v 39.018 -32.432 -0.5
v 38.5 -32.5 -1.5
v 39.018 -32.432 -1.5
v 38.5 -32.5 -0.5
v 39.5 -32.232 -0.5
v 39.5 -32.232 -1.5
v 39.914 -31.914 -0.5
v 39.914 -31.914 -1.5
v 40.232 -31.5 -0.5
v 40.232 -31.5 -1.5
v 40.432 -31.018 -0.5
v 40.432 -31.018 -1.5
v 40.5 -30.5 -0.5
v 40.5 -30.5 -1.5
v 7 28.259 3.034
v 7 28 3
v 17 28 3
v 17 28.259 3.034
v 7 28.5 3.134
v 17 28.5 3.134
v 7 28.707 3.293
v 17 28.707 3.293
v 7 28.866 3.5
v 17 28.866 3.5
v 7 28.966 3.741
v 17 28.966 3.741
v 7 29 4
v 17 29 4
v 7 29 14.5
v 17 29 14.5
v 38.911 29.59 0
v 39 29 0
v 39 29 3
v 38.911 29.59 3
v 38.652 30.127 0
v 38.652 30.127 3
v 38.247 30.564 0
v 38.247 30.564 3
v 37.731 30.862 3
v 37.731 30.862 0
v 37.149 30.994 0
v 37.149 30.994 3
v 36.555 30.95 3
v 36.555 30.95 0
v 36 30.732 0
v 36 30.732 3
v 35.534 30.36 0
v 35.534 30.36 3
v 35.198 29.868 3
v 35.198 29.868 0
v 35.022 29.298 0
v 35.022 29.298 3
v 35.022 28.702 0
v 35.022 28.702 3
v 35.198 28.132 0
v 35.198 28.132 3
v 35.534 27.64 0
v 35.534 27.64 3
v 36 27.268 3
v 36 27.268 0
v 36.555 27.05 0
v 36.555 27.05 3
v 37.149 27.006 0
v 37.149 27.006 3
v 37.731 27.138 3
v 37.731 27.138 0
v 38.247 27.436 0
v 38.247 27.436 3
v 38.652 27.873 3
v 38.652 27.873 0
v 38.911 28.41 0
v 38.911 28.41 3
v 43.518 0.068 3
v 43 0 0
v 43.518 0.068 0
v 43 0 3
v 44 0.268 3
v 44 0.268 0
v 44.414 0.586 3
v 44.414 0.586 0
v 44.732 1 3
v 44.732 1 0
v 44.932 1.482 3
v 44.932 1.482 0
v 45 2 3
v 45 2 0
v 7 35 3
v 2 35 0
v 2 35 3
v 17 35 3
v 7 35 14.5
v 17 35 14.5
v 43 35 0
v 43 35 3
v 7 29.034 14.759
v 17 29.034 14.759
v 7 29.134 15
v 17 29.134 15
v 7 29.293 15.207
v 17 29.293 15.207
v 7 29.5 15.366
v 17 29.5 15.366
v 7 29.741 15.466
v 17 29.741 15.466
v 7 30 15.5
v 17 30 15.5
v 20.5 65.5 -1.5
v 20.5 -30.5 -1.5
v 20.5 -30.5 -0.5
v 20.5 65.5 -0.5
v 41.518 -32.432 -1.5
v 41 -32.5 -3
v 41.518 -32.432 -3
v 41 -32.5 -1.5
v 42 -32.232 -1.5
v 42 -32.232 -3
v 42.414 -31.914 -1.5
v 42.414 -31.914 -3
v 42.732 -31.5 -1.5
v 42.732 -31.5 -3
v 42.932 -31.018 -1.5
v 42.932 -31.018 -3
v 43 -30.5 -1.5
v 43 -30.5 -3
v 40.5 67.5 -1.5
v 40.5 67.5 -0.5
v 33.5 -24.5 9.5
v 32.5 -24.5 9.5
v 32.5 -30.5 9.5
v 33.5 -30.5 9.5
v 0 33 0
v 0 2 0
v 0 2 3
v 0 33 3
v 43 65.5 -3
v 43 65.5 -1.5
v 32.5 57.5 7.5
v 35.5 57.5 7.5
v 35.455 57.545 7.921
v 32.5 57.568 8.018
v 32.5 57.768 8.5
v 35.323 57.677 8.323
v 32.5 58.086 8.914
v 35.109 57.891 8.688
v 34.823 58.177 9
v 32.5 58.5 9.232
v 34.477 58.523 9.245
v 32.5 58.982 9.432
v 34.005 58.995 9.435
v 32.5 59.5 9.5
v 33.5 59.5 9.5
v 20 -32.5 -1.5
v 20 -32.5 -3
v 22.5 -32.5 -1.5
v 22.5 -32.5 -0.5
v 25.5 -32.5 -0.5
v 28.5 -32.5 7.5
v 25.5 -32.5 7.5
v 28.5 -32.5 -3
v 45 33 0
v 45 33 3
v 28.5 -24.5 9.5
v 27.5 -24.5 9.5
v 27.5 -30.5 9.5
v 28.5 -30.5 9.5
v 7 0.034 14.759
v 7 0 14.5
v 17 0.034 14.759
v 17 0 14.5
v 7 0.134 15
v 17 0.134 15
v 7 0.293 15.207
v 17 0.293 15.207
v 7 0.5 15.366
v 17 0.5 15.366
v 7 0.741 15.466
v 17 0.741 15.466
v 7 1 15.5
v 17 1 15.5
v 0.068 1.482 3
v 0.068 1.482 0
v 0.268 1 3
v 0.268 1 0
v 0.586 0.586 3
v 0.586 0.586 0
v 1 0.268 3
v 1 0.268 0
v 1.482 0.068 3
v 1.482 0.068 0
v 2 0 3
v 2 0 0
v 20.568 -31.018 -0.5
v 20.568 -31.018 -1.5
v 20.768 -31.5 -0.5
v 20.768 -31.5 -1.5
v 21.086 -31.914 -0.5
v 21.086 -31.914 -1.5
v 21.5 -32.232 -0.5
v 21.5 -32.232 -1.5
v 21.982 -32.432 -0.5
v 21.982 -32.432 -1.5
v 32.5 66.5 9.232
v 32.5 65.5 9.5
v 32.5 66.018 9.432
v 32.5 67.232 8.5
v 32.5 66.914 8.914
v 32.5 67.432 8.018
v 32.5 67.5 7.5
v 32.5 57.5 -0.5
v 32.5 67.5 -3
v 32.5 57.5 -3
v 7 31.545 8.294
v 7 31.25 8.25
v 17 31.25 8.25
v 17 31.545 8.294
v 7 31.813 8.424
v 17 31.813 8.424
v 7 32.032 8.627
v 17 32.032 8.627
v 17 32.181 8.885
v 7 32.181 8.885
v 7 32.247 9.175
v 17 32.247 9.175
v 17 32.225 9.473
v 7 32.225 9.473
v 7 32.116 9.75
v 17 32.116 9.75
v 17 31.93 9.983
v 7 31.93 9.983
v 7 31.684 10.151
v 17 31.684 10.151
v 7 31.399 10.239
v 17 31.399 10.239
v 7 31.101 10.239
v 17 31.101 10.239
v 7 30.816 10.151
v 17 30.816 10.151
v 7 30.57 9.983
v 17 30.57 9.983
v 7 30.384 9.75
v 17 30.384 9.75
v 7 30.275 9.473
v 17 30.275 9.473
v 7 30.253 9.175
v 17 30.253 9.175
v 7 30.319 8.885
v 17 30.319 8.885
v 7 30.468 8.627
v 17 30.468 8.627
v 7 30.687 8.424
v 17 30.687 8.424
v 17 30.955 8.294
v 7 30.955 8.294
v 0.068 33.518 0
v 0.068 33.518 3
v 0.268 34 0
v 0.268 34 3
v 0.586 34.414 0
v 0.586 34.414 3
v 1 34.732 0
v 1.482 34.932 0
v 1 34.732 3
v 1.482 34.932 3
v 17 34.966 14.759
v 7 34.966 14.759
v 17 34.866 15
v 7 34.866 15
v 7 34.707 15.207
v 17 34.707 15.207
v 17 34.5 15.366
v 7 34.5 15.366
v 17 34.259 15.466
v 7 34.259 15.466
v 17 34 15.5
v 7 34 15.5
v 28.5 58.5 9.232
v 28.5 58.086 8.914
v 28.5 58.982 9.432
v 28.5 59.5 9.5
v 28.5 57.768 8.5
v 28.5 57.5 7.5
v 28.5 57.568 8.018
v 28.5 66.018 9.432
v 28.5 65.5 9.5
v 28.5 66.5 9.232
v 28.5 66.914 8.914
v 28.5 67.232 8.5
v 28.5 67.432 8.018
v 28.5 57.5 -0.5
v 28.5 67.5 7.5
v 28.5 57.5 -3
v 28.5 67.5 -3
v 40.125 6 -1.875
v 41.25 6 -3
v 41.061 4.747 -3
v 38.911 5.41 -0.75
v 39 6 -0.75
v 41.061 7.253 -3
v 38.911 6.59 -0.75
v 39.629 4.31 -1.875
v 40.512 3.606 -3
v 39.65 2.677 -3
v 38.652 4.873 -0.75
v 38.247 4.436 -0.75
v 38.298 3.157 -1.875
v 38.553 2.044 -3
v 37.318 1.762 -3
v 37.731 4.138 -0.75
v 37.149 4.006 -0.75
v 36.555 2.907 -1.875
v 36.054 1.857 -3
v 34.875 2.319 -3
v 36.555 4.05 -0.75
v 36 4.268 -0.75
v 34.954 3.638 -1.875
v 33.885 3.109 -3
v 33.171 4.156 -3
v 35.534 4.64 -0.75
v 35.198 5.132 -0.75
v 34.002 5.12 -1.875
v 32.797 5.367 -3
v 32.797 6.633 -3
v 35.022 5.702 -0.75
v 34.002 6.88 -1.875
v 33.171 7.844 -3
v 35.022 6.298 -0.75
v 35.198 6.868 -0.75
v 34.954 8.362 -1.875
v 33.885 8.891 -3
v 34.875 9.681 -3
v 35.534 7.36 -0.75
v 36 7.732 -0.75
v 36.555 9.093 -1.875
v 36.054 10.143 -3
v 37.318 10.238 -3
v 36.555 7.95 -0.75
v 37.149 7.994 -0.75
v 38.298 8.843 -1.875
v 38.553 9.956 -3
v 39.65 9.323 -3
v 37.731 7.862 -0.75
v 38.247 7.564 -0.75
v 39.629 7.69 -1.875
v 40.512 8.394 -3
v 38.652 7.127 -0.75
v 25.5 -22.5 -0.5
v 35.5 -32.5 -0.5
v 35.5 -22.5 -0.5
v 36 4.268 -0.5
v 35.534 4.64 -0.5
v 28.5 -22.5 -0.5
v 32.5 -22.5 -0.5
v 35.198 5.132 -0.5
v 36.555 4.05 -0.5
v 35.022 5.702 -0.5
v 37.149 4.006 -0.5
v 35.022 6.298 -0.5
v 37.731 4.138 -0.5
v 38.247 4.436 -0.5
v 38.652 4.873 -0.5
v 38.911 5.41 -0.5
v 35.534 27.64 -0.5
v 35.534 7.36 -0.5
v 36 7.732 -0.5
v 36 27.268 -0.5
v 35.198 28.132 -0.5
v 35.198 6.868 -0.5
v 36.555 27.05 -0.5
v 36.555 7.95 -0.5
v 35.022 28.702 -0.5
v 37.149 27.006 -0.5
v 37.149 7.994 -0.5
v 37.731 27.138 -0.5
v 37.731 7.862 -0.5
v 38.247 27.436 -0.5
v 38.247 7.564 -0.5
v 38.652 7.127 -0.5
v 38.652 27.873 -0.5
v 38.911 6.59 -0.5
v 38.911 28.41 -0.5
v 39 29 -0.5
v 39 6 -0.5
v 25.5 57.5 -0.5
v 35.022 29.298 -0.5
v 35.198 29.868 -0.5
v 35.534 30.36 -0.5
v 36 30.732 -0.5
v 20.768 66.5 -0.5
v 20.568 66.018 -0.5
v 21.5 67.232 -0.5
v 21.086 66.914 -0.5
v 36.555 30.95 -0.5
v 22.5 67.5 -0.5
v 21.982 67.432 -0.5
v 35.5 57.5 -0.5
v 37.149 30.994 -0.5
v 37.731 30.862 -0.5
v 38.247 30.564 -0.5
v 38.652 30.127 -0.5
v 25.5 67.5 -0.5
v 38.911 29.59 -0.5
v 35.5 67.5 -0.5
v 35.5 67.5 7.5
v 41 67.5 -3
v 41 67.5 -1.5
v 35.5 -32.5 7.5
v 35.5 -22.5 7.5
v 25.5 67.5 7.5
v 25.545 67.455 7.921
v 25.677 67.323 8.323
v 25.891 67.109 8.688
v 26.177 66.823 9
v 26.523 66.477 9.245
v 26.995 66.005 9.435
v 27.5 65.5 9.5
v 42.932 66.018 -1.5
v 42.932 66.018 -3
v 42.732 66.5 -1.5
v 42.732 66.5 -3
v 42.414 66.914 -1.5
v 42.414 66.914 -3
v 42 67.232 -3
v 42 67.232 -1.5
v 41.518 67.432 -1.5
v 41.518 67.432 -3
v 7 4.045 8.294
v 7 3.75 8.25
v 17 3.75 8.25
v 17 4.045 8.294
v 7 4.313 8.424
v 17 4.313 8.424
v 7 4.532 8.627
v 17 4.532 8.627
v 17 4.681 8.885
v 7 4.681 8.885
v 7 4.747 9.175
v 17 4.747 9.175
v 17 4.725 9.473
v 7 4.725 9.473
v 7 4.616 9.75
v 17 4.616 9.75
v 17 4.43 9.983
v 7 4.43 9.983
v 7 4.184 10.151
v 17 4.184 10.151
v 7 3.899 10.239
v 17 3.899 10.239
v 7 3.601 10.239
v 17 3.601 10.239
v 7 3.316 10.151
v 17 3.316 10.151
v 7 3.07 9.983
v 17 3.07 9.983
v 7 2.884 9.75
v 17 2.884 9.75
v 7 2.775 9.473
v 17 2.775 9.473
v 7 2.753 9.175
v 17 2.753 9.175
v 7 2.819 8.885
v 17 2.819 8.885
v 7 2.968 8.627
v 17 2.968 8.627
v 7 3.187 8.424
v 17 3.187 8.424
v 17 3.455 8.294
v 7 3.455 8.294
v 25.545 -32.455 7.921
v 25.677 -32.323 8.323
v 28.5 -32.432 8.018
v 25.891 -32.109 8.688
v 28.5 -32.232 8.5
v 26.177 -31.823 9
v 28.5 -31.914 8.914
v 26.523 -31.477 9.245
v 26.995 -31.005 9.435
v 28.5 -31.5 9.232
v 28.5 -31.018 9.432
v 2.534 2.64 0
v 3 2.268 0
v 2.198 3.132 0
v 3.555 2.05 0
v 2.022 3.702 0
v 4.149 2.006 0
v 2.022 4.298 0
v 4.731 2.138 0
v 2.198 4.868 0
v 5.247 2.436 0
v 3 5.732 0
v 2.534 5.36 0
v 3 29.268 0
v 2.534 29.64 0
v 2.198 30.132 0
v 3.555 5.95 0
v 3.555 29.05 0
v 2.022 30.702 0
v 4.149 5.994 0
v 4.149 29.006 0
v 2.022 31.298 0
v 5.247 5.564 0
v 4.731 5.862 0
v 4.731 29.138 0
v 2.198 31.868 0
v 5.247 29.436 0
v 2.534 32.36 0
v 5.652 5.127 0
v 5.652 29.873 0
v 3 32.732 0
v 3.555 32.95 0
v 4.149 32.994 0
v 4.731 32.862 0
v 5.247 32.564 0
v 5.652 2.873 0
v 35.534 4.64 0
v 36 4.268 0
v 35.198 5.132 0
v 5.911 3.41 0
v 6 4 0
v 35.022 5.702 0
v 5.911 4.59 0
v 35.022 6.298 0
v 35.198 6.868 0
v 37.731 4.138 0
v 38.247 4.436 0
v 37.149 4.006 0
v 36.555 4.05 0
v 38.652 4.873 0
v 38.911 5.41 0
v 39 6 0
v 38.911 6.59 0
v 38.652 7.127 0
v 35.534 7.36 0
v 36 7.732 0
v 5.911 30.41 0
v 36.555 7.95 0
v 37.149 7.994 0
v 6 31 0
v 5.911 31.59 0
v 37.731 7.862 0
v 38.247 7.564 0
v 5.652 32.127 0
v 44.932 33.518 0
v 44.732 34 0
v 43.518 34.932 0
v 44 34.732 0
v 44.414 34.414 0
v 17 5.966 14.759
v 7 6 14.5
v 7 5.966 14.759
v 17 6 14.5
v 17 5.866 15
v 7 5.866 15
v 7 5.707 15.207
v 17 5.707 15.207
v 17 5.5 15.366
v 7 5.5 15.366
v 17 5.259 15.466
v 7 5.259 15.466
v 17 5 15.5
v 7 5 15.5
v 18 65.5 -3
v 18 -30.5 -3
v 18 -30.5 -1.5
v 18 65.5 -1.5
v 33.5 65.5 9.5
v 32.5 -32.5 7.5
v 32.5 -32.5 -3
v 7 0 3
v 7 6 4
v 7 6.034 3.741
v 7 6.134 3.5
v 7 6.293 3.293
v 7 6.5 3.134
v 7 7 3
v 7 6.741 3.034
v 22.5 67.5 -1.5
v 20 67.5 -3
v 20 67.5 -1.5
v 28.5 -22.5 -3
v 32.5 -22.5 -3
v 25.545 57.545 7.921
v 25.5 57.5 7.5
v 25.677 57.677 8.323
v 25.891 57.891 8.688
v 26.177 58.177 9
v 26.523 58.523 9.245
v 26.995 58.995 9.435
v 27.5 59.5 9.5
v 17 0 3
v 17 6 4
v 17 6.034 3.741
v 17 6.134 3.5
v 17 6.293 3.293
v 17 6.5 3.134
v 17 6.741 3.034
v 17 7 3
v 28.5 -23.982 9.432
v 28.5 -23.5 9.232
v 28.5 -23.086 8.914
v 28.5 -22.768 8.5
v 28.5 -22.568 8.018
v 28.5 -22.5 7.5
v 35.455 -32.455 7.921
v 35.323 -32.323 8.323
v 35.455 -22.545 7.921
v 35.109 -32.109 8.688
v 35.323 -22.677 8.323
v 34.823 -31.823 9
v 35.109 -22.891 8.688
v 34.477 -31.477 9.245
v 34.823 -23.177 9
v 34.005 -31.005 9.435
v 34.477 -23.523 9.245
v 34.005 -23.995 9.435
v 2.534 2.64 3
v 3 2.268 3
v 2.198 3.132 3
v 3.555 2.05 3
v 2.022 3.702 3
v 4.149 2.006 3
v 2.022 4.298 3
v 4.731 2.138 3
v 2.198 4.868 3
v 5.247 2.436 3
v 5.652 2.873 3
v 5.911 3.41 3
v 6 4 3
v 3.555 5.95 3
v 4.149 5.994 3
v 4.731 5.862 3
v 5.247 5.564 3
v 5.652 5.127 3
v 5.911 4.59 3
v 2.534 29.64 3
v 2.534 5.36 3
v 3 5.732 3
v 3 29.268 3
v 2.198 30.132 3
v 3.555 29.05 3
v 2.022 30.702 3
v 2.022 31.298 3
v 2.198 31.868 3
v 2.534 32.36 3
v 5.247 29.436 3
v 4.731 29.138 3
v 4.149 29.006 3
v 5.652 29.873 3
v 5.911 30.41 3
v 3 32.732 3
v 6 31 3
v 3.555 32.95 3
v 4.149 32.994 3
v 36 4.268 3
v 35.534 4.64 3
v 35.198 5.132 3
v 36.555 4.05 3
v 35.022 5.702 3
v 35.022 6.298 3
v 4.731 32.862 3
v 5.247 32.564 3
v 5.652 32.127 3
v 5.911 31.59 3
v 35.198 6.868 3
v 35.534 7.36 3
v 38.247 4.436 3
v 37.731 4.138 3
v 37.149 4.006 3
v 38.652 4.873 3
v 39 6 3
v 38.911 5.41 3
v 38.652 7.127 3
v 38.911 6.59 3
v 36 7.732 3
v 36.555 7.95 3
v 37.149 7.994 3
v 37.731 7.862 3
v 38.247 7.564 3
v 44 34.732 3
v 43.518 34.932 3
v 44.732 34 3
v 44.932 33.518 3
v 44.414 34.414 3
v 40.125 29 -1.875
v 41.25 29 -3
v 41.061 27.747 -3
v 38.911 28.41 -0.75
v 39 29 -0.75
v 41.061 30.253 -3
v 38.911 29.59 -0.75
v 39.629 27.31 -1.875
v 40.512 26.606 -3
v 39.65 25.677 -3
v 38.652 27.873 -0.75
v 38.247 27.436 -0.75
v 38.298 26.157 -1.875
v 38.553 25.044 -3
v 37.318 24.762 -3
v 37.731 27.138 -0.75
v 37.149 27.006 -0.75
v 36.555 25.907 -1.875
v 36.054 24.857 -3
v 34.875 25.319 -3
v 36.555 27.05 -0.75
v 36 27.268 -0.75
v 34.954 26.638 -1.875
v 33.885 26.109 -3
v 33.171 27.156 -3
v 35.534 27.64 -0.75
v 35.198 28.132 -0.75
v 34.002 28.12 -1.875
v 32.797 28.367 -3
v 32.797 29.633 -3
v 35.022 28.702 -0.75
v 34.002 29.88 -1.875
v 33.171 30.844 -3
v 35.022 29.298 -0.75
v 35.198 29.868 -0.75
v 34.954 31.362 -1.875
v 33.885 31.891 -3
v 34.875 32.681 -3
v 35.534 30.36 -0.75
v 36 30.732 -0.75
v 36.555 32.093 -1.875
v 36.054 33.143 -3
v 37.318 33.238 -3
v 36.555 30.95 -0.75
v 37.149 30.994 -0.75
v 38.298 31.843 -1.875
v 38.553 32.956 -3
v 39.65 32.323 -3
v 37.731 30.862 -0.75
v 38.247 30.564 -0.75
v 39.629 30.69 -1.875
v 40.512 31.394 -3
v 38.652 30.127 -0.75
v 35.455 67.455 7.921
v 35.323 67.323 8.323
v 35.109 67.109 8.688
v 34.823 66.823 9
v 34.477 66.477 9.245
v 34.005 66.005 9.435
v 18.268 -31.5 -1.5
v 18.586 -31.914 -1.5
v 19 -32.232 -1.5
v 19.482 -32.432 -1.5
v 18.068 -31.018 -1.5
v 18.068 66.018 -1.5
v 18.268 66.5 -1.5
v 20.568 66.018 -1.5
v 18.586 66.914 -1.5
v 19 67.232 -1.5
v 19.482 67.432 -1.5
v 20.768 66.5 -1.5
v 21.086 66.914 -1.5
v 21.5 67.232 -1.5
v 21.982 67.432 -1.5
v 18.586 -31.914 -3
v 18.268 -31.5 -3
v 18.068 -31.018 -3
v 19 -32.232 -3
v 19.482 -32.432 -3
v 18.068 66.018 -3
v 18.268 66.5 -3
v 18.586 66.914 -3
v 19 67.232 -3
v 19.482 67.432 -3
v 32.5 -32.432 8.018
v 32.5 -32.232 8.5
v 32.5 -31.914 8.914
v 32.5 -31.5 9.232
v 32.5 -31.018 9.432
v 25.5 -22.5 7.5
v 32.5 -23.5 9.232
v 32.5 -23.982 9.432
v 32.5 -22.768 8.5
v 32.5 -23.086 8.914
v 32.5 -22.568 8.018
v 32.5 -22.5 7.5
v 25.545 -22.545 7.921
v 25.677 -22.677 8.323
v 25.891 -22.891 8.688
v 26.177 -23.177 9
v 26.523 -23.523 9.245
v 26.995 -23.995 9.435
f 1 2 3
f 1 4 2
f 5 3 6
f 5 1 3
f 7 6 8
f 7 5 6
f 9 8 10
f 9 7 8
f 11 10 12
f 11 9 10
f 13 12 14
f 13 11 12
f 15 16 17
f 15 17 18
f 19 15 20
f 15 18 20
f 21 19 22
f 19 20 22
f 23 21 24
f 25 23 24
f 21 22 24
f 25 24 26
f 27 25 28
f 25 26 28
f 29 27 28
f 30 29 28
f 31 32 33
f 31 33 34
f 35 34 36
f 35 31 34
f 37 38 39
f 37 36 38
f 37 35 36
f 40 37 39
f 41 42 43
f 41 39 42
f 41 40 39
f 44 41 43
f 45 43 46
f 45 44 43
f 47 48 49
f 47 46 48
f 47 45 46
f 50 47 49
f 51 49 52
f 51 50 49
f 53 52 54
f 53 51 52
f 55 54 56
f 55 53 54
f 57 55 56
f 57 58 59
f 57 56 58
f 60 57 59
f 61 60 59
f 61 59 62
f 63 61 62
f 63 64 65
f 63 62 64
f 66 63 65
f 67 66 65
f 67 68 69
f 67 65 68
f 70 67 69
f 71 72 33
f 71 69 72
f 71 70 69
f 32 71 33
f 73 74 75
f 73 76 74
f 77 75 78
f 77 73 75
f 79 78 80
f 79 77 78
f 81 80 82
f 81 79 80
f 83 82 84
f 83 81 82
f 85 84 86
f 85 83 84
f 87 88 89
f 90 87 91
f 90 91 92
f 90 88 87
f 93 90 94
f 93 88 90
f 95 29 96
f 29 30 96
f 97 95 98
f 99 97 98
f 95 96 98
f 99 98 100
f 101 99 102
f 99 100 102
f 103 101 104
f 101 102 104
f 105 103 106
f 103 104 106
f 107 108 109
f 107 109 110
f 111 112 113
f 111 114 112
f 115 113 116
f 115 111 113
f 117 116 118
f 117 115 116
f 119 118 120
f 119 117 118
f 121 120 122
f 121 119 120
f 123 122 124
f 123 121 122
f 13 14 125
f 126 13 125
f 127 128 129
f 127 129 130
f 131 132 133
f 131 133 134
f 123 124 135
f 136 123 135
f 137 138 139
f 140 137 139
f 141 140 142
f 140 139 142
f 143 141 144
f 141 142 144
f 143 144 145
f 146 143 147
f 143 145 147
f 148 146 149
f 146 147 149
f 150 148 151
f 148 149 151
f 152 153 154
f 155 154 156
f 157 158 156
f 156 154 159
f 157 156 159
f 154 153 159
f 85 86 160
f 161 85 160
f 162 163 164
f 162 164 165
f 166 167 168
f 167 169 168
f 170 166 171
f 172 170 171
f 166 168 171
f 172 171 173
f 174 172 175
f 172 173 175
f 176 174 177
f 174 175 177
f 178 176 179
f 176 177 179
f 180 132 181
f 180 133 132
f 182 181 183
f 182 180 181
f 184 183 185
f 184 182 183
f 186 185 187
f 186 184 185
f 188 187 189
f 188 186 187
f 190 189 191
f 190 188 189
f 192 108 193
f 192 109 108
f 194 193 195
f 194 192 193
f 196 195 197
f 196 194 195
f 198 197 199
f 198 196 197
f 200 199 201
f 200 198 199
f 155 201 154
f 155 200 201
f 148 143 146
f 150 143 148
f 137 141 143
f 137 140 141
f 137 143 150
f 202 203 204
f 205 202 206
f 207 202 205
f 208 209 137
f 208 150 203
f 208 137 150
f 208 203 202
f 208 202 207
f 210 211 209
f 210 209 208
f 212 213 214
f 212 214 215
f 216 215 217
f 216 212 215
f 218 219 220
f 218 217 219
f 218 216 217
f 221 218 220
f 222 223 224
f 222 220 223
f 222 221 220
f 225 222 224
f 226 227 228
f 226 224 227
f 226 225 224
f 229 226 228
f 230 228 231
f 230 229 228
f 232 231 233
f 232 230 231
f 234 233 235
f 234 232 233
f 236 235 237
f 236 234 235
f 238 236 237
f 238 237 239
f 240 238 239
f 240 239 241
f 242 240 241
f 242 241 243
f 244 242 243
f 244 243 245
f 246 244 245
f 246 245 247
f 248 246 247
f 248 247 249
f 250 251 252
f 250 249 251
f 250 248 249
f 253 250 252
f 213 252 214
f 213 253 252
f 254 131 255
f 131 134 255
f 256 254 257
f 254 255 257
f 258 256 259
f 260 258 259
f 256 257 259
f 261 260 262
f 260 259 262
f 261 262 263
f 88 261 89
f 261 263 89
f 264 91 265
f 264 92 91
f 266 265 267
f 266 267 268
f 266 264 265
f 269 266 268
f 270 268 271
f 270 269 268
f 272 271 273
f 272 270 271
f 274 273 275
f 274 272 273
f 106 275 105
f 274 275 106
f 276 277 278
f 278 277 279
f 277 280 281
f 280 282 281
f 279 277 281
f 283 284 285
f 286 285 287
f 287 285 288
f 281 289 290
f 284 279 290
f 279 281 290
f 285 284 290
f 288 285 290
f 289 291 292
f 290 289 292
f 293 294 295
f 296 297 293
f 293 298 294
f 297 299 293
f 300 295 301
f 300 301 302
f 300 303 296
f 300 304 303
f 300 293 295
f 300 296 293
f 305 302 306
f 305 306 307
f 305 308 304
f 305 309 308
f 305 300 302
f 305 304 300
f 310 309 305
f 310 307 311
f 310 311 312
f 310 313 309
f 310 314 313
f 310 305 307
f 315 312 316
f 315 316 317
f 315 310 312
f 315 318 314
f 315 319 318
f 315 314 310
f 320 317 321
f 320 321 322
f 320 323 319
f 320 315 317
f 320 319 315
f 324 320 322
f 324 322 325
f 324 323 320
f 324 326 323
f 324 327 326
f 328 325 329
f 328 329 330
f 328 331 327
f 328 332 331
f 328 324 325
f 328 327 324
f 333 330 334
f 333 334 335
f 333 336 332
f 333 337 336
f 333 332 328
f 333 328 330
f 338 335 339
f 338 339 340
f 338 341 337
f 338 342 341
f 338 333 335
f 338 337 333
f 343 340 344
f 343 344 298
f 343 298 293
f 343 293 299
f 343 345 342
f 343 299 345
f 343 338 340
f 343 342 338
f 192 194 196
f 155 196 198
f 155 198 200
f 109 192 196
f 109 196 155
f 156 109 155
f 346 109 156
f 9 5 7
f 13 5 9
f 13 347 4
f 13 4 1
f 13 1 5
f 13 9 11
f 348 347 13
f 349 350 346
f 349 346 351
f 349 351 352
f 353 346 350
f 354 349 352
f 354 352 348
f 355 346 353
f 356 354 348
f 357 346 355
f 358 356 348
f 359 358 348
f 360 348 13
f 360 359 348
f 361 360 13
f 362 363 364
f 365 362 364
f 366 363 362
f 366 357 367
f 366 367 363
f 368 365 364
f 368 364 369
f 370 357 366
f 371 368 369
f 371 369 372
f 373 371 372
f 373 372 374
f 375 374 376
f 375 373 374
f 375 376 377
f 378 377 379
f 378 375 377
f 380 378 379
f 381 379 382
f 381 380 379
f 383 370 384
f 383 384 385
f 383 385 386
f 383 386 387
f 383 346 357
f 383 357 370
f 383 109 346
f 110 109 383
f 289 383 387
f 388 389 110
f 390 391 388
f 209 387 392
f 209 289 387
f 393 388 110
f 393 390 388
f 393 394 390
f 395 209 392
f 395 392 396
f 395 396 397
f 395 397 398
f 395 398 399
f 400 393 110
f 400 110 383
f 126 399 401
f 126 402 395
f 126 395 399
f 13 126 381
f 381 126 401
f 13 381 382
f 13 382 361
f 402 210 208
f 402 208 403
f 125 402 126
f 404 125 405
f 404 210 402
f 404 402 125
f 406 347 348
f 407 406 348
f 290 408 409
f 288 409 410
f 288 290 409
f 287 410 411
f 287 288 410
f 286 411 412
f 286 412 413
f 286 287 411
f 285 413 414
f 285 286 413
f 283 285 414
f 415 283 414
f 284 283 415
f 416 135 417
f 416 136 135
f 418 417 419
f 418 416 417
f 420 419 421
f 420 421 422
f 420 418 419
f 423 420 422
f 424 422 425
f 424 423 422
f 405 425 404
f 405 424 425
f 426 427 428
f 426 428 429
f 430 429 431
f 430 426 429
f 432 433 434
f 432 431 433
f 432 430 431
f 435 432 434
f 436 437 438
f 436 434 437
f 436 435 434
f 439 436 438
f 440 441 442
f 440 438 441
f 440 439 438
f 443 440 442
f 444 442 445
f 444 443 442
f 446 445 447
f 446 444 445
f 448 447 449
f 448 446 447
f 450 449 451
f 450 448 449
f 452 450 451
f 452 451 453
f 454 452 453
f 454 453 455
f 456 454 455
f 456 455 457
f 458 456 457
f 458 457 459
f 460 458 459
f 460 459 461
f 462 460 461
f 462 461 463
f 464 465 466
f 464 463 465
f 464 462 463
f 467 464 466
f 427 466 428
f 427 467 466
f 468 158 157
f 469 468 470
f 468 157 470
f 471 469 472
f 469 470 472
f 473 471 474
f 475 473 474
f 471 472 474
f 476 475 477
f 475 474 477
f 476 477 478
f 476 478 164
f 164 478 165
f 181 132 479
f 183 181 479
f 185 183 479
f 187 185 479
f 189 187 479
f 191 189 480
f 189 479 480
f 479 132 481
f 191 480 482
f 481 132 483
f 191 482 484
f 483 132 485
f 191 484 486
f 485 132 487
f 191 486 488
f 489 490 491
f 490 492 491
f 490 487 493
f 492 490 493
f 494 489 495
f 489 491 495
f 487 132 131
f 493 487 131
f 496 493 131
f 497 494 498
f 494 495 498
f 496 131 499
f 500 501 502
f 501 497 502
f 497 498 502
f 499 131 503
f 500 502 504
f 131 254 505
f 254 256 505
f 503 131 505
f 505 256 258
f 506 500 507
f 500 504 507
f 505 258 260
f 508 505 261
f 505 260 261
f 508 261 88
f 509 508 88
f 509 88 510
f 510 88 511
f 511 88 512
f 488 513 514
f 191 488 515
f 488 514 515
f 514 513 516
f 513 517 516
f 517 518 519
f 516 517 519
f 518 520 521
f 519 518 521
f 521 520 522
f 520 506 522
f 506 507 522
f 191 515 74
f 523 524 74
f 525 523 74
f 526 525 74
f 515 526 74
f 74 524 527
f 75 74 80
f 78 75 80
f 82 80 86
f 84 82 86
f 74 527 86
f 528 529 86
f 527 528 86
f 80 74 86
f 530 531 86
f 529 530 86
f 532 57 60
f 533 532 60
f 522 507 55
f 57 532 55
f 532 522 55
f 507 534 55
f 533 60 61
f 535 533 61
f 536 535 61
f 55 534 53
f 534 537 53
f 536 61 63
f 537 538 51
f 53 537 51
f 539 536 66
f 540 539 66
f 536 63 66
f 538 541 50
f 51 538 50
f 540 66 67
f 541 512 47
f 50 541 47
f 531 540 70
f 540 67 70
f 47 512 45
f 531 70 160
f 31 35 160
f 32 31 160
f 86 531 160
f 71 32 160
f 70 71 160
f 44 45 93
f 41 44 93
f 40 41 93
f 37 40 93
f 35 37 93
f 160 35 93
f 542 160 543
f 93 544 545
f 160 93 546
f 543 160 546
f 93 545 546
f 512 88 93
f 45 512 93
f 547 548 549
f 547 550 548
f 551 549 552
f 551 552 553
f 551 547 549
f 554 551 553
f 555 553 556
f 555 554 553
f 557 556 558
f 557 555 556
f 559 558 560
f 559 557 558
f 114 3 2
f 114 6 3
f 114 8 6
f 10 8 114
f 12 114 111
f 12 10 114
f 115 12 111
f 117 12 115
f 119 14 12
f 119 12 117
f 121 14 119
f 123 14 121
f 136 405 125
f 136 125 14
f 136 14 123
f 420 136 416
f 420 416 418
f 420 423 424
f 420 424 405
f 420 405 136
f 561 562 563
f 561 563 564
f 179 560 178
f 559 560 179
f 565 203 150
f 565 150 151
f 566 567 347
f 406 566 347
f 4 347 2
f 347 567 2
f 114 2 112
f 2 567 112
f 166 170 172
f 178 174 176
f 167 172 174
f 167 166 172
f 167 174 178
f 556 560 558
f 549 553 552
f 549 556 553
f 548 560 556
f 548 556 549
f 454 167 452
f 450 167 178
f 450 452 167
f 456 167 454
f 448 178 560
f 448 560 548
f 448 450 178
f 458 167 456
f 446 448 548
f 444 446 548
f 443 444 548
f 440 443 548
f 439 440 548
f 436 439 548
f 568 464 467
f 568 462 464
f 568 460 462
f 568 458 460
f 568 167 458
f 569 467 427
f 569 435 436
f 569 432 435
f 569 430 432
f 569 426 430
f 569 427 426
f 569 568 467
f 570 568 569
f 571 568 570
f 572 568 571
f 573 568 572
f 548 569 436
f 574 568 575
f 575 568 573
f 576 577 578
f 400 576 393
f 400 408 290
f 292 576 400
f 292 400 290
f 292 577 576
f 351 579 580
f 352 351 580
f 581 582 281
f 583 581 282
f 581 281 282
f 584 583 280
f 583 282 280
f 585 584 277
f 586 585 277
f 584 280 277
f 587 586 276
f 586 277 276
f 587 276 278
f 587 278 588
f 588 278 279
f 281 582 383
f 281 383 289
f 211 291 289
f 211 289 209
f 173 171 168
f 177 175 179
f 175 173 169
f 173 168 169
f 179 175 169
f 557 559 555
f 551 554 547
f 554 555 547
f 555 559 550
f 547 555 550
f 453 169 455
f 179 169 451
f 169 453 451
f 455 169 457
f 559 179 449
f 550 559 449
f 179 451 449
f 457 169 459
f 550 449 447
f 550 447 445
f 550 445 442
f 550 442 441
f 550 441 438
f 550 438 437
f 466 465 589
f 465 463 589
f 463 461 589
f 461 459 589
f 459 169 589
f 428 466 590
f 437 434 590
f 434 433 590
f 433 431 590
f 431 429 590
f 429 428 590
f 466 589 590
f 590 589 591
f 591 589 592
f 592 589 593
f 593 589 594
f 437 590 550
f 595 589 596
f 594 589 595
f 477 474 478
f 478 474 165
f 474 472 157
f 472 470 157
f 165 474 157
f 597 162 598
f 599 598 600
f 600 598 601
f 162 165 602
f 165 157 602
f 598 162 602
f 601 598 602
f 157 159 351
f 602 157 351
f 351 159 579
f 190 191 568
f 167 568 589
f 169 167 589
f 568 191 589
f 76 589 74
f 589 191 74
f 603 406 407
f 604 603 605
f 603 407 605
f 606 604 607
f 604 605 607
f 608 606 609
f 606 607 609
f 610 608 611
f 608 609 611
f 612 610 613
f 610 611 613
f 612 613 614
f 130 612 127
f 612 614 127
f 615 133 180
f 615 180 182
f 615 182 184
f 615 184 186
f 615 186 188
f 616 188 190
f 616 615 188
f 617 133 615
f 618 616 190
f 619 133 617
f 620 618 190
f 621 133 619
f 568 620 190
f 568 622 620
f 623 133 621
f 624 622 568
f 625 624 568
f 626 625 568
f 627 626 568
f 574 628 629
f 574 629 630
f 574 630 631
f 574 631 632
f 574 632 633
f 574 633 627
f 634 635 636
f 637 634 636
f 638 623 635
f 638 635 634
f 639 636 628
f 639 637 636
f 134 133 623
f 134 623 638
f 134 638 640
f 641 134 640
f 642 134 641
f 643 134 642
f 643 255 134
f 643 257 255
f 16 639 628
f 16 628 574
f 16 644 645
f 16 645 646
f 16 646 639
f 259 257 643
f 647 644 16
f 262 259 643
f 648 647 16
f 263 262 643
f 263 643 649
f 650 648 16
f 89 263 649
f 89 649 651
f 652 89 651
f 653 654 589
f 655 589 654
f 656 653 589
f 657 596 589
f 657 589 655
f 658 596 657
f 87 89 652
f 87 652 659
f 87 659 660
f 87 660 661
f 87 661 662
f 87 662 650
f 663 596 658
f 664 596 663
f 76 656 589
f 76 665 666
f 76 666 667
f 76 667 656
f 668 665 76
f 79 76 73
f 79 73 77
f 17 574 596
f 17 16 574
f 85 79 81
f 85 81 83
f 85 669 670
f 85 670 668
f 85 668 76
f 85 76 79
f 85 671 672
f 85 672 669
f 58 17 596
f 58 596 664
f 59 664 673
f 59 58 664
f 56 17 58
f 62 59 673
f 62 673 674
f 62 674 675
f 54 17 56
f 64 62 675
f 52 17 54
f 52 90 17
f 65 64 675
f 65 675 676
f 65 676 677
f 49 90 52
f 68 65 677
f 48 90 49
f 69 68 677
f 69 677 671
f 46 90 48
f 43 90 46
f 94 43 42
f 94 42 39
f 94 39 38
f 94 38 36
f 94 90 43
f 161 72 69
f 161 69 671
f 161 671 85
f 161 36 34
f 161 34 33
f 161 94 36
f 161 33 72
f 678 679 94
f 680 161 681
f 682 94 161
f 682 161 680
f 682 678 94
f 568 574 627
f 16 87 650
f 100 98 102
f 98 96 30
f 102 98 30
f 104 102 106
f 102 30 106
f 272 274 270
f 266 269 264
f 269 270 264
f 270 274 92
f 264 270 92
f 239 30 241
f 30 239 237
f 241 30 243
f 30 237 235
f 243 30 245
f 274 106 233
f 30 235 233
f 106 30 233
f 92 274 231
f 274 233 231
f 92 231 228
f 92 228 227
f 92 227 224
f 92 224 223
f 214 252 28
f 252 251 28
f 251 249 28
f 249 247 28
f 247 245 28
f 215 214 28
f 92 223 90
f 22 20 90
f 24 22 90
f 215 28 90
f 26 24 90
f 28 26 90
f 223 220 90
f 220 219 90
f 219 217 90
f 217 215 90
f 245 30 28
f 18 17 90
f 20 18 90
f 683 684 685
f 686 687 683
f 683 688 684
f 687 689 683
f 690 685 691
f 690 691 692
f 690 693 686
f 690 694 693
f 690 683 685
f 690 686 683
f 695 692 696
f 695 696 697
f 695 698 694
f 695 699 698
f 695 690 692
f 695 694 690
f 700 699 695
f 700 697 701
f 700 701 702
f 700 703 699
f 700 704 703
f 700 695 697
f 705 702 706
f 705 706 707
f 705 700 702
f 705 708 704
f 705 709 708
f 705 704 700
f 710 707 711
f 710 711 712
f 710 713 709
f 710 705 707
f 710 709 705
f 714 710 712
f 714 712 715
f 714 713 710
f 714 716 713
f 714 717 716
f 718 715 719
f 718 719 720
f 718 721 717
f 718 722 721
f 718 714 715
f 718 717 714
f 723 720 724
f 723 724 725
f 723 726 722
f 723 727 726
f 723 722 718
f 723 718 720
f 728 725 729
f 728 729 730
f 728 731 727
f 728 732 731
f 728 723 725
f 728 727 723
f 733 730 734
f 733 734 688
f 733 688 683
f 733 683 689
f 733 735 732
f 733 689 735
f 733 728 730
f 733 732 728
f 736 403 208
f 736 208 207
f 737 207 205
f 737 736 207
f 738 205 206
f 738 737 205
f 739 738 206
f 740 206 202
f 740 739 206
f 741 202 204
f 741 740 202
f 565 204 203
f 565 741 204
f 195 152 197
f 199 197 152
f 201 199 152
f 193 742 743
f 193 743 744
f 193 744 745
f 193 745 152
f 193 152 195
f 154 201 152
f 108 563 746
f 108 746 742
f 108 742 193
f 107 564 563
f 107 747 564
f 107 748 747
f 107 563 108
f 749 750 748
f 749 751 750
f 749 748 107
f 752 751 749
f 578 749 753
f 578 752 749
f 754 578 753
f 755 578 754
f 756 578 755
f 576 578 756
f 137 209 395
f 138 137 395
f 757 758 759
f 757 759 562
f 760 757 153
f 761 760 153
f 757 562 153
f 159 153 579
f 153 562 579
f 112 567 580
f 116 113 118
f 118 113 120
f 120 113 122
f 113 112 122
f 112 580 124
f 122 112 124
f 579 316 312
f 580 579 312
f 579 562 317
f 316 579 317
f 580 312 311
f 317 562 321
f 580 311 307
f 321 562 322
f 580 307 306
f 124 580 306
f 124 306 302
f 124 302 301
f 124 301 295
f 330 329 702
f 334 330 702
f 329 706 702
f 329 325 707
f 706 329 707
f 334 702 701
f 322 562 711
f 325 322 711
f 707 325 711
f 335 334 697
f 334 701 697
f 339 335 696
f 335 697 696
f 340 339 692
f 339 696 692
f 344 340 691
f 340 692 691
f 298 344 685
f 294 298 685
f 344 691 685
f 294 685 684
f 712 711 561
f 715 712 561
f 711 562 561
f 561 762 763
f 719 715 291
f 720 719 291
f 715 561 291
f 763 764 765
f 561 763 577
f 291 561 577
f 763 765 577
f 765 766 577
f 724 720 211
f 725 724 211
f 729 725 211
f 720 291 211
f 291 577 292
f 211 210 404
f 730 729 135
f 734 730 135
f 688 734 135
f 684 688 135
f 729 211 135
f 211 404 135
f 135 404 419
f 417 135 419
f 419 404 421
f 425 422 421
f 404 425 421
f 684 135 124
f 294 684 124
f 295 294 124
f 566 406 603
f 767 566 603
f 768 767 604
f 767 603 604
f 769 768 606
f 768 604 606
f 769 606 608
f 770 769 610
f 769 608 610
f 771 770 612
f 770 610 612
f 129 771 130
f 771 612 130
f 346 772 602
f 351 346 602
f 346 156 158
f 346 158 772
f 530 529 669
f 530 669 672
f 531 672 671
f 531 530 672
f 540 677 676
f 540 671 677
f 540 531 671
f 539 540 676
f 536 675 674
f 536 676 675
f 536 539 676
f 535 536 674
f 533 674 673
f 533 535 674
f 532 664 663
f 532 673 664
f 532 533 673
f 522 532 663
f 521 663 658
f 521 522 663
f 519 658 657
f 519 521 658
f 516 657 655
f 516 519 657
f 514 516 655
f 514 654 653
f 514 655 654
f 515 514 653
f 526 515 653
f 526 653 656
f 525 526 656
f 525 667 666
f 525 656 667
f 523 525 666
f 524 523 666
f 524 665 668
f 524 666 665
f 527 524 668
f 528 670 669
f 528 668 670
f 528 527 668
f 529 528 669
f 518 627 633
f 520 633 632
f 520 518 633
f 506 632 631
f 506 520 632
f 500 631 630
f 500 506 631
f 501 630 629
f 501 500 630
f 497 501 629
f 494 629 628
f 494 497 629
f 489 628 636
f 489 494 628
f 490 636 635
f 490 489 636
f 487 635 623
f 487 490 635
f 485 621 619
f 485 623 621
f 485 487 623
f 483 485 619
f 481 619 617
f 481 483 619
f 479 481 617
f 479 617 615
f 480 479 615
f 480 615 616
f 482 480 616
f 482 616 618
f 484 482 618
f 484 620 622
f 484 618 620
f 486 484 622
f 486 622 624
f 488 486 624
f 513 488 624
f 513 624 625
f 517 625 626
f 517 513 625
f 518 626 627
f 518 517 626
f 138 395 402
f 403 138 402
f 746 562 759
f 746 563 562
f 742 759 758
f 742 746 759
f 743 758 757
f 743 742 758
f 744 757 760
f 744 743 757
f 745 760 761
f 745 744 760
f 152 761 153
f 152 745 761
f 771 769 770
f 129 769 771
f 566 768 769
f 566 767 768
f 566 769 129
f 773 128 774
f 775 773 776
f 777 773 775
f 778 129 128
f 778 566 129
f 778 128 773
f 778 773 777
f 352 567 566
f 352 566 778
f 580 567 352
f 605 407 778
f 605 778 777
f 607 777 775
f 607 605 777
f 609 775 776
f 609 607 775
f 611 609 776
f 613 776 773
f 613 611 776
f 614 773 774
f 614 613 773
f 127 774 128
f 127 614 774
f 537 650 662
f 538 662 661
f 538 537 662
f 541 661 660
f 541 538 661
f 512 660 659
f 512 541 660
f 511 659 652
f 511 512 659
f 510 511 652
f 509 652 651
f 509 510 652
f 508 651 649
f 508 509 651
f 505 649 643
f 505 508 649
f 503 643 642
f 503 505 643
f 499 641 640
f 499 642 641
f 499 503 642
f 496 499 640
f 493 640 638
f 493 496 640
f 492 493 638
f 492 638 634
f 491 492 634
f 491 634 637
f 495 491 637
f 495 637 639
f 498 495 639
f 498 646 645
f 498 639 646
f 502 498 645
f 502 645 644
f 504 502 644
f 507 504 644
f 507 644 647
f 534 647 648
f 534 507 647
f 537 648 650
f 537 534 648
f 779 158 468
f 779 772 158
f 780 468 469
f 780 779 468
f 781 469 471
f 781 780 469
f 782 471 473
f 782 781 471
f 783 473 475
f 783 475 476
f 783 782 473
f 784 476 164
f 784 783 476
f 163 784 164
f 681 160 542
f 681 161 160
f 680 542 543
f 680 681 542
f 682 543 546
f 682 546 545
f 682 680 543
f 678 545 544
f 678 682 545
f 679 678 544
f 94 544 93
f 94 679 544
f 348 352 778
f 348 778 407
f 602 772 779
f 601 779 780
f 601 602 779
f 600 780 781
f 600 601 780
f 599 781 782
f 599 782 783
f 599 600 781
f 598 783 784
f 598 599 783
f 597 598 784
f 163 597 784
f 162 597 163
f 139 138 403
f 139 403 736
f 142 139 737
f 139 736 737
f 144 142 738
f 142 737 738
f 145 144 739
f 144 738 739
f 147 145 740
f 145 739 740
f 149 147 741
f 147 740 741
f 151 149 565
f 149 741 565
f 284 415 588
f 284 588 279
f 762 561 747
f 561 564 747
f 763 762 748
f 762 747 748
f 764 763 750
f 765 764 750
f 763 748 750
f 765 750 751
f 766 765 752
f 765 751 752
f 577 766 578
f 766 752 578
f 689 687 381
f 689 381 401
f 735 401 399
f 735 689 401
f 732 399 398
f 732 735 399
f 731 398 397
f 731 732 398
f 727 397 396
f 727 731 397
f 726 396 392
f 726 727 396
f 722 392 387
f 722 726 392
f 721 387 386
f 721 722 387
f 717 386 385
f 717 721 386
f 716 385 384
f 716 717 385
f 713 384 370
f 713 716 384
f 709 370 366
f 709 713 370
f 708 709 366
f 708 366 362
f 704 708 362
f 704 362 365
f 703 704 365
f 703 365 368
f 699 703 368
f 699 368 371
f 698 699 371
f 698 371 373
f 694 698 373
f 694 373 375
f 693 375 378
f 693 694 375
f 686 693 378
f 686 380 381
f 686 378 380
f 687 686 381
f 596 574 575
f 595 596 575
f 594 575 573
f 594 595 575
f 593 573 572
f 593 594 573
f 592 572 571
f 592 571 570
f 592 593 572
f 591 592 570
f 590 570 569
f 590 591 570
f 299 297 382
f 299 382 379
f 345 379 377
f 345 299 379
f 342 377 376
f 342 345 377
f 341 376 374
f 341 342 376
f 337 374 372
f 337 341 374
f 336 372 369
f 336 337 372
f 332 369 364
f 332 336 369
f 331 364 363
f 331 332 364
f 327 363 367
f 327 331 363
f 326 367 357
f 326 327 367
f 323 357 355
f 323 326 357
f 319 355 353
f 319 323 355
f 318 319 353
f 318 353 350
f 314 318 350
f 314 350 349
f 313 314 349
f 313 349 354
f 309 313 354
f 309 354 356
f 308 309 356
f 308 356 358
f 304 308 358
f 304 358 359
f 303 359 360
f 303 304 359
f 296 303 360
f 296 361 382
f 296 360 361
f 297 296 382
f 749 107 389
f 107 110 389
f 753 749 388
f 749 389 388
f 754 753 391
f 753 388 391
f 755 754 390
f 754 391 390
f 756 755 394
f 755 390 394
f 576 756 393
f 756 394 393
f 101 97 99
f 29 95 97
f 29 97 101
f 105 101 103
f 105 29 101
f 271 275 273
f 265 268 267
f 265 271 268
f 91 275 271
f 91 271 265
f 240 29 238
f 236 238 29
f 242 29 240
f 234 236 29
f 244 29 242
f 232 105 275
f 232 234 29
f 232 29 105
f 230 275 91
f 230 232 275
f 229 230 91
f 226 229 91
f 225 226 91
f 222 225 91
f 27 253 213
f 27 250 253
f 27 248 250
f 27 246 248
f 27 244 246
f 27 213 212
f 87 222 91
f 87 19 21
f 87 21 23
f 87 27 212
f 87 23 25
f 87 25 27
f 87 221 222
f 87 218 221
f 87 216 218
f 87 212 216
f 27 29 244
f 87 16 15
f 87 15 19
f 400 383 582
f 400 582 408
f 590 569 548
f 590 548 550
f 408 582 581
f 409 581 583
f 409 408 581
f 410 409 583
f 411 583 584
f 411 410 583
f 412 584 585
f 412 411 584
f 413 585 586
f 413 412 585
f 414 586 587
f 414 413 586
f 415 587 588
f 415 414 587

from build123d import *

# Parameters (mm, degrees)
BOX007_W          = 4
BOX007_H          = 10
BOX007_DEPTH      = 13
BOX008_W          = 4
BOX008_H          = 10
BOX008_DEPTH      = 13
BOX005_W          = 10
BOX005_H          = 10
BOX005_DEPTH      = 10
FILLET003_R       = 2
BOX006_W          = 10
BOX006_H          = 10
BOX006_DEPTH      = 10
FILLET004_R       = 2
CYLINDER007_R     = 2
CYLINDER007_DEPTH = 10
CYLINDER006_R     = 2
CYLINDER006_DEPTH = 10
BOX003_W          = 25
BOX003_H          = 100
BOX003_DEPTH      = 1.5
FILLET001_R       = 2
BOX004_W          = 20
BOX004_H          = 100
BOX004_DEPTH      = 1
FILLET002_R       = 2
CHAMFER_SIZE      = 2.25
CYLINDER_R        = 1
CYLINDER_DEPTH    = 28
CYLINDER004_R     = 2
CYLINDER004_DEPTH = 10
CYLINDER005_R     = 2
CYLINDER005_DEPTH = 10
CYLINDER003_R     = 2
CYLINDER003_DEPTH = 10
CYLINDER001_R     = 1
CYLINDER001_DEPTH = 28
CYLINDER002_R     = 2
CYLINDER002_DEPTH = 10
BOX002_W          = 16
BOX002_H          = 23
BOX002_DEPTH      = 12.5
BOX001_W          = 10
BOX001_H          = 35
BOX001_DEPTH      = 12.5
BOX_W             = 45
BOX_H             = 35
BOX_DEPTH         = 3
FILLET_R          = 2
FILLET005_R       = 1


with BuildPart() as cube006:
    # Box007 → Box007 (new body)
    with BuildSketch(Plane(origin=(28.5, -32.5, -3), x_dir=(1, 0, 0), z_dir=(0, 0, 1))):
        with Locations((2, 5)):
            Rectangle(BOX007_W, BOX007_H)
    extrude(amount=BOX007_DEPTH)


with BuildPart() as fusion005:
    # Box008 → Box008 (new body)
    with BuildSketch(Plane(origin=(28.5, 57.5, -3), x_dir=(1, 0, 0), z_dir=(0, 0, 1))):
        with Locations((2, 5)):
            Rectangle(BOX008_W, BOX008_H)
    extrude(amount=BOX008_DEPTH)

    # Fusion005: union Cube006
    add(cube006.part)


with BuildPart() as fillet003:
    # Box005 → Box005 (new body)
    with BuildSketch(Plane(origin=(25.5, -32.5, -0.5), x_dir=(1, 0, 0), z_dir=(0, 0, 1))):
        with Locations((5, 5)):
            Rectangle(BOX005_W, BOX005_H)
    extrude(amount=BOX005_DEPTH)

    # Fillet003
    fillet003_edges = [fillet003.edges().sort_by_distance(p)[0] for p in [
        (25.5, -27.5, 9.5),
        (35.5, -27.5, 9.5),
        (30.5, -32.5, 9.5),
        (30.5, -22.5, 9.5),
    ]]
    fillet(fillet003_edges, radius=FILLET003_R)


with BuildPart() as fillet004:
    # Box006 → Box006 (new body)
    with BuildSketch(Plane(origin=(25.5, 57.5, -0.5), x_dir=(1, 0, 0), z_dir=(0, 0, 1))):
        with Locations((5, 5)):
            Rectangle(BOX006_W, BOX006_H)
    extrude(amount=BOX006_DEPTH)

    # Fillet004
    fillet004_edges = [fillet004.edges().sort_by_distance(p)[0] for p in [
        (25.5, 62.5, 9.5),
        (35.5, 62.5, 9.5),
        (30.5, 57.5, 9.5),
        (30.5, 67.5, 9.5),
    ]]
    fillet(fillet004_edges, radius=FILLET004_R)


with BuildPart() as cylinder007:
    # Cylinder007 → Cylinder007 (new body)
    with BuildSketch(Plane(origin=(37, 6, -5), x_dir=(1, 0, 0), z_dir=(0, 0, 1))):
        Circle(CYLINDER007_R)
    extrude(amount=CYLINDER007_DEPTH)


with BuildPart() as fusion002:
    # Cylinder006 → Cylinder006 (new body)
    with BuildSketch(Plane(origin=(37, 29, -5), x_dir=(1, 0, 0), z_dir=(0, 0, 1))):
        Circle(CYLINDER006_R)
    extrude(amount=CYLINDER006_DEPTH)

    # Fusion002: union Cylinder007
    add(cylinder007.part)


with BuildPart() as fillet001:
    # Box003 → Box003 (new body)
    with BuildSketch(Plane(origin=(18, -32.5, -3), x_dir=(1, 0, 0), z_dir=(0, 0, 1))):
        with Locations((12.5, 50)):
            Rectangle(BOX003_W, BOX003_H)
    extrude(amount=BOX003_DEPTH)

    # Fillet001
    fillet001_edges = [fillet001.edges().sort_by_distance(p)[0] for p in [
        (18, -32.5, -2.25),
        (18, 67.5, -2.25),
        (43, -32.5, -2.25),
        (43, 67.5, -2.25),
    ]]
    fillet(fillet001_edges, radius=FILLET001_R)


with BuildPart() as bottom:
    # Box004 → Box004 (new body)
    with BuildSketch(Plane(origin=(20.5, -32.5, -1.5), x_dir=(1, 0, 0), z_dir=(0, 0, 1))):
        with Locations((10, 50)):
            Rectangle(BOX004_W, BOX004_H)
    extrude(amount=BOX004_DEPTH)

    # Fillet002
    fillet002_edges = [bottom.edges().sort_by_distance(p)[0] for p in [
        (20.5, -32.5, -1),
        (20.5, 67.5, -1),
        (40.5, -32.5, -1),
    ]]
    fillet(fillet002_edges, radius=FILLET002_R)

    # Fusion003: union Fillet001
    add(fillet001.part)

    # Cut002: cut Fusion002
    add(fusion002.part, mode=Mode.SUBTRACT)

    # Fusion004: union Fillet003, Fillet004
    add(fillet003.part)
    add(fillet004.part)

    # Cut003: cut Fusion005
    add(fusion005.part, mode=Mode.SUBTRACT)

    # Chamfer
    chamfer_edges = [bottom.edges().sort_by_distance(p)[0] for p in [
        (35, 6, -3),
        (35, 29, -3),
    ]]
    chamfer(chamfer_edges, length=CHAMFER_SIZE)


with BuildPart() as cylinder:
    # Cylinder → Cylinder (new body)
    with BuildSketch(Plane(origin=(0, 3.75, 9.25), x_dir=(0, 0, -1), z_dir=(1, 0, 0))):
        Circle(CYLINDER_R)
    extrude(amount=CYLINDER_DEPTH)


with BuildPart() as cylinder004:
    # Cylinder004 → Cylinder004 (new body)
    with BuildSketch(Plane(origin=(37, 6, -5), x_dir=(1, 0, 0), z_dir=(0, 0, 1))):
        Circle(CYLINDER004_R)
    extrude(amount=CYLINDER004_DEPTH)


with BuildPart() as cylinder005:
    # Cylinder005 → Cylinder005 (new body)
    with BuildSketch(Plane(origin=(37, 29, -5), x_dir=(1, 0, 0), z_dir=(0, 0, 1))):
        Circle(CYLINDER005_R)
    extrude(amount=CYLINDER005_DEPTH)


with BuildPart() as cylinder003:
    # Cylinder003 → Cylinder003 (new body)
    with BuildSketch(Plane(origin=(4, 31, 0), x_dir=(1, 0, 0), z_dir=(0, 0, 1))):
        Circle(CYLINDER003_R)
    extrude(amount=CYLINDER003_DEPTH)


with BuildPart() as cylinder001:
    # Cylinder001 → Cylinder001 (new body)
    with BuildSketch(Plane(origin=(0, 31.25, 9.25), x_dir=(0, 0, -1), z_dir=(1, 0, 0))):
        Circle(CYLINDER001_R)
    extrude(amount=CYLINDER001_DEPTH)


with BuildPart() as fusion001:
    # Cylinder002 → Cylinder002 (new body)
    with BuildSketch(Plane(origin=(4, 4, 0), x_dir=(1, 0, 0), z_dir=(0, 0, 1))):
        Circle(CYLINDER002_R)
    extrude(amount=CYLINDER002_DEPTH)

    # Fusion001: union Cylinder, Cylinder004, Cylinder005, Cylinder003, Cylinder001
    add(cylinder.part)
    add(cylinder004.part)
    add(cylinder005.part)
    add(cylinder003.part)
    add(cylinder001.part)


with BuildPart() as cube001:
    # Box002 → Box002 (new body)
    with BuildSketch(Plane(origin=(7, 6, 3), x_dir=(1, 0, 0), z_dir=(0, 0, 1))):
        with Locations((8, 11.5)):
            Rectangle(BOX002_W, BOX002_H)
    extrude(amount=BOX002_DEPTH)


with BuildPart() as cut:
    # Box001 → Box001 (new body)
    with BuildSketch(Plane(origin=(7, 0, 3), x_dir=(1, 0, 0), z_dir=(0, 0, 1))):
        with Locations((5, 17.5)):
            Rectangle(BOX001_W, BOX001_H)
    extrude(amount=BOX001_DEPTH)

    # Cut: cut Cube001
    add(cube001.part, mode=Mode.SUBTRACT)


with BuildPart() as top:
    # Box → Box (new body)
    with BuildSketch(Plane.XY):
        with Locations((22.5, 17.5)):
            Rectangle(BOX_W, BOX_H)
    extrude(amount=BOX_DEPTH)

    # Fillet
    fillet_edges = [top.edges().sort_by_distance(p)[0] for p in [
        (0, 0, 1.5),
        (0, 35, 1.5),
        (45, 0, 1.5),
        (45, 35, 1.5),
    ]]
    fillet(fillet_edges, radius=FILLET_R)

    # Fusion: union Cut
    add(cut.part)

    # Cut001: cut Fusion001
    add(fusion001.part, mode=Mode.SUBTRACT)

    # Fillet005
    fillet005_edges = [top.edges().sort_by_distance(p)[0] for p in [
        (12, 6, 3),
        (12, 29, 3),
        (12, 6, 15.5),
        (12, 29, 15.5),
        (12, 0, 15.5),
        (12, 35, 15.5),
    ]]
    fillet(fillet005_edges, radius=FILLET005_R)


solid = Compound([bottom.part, top.part])
